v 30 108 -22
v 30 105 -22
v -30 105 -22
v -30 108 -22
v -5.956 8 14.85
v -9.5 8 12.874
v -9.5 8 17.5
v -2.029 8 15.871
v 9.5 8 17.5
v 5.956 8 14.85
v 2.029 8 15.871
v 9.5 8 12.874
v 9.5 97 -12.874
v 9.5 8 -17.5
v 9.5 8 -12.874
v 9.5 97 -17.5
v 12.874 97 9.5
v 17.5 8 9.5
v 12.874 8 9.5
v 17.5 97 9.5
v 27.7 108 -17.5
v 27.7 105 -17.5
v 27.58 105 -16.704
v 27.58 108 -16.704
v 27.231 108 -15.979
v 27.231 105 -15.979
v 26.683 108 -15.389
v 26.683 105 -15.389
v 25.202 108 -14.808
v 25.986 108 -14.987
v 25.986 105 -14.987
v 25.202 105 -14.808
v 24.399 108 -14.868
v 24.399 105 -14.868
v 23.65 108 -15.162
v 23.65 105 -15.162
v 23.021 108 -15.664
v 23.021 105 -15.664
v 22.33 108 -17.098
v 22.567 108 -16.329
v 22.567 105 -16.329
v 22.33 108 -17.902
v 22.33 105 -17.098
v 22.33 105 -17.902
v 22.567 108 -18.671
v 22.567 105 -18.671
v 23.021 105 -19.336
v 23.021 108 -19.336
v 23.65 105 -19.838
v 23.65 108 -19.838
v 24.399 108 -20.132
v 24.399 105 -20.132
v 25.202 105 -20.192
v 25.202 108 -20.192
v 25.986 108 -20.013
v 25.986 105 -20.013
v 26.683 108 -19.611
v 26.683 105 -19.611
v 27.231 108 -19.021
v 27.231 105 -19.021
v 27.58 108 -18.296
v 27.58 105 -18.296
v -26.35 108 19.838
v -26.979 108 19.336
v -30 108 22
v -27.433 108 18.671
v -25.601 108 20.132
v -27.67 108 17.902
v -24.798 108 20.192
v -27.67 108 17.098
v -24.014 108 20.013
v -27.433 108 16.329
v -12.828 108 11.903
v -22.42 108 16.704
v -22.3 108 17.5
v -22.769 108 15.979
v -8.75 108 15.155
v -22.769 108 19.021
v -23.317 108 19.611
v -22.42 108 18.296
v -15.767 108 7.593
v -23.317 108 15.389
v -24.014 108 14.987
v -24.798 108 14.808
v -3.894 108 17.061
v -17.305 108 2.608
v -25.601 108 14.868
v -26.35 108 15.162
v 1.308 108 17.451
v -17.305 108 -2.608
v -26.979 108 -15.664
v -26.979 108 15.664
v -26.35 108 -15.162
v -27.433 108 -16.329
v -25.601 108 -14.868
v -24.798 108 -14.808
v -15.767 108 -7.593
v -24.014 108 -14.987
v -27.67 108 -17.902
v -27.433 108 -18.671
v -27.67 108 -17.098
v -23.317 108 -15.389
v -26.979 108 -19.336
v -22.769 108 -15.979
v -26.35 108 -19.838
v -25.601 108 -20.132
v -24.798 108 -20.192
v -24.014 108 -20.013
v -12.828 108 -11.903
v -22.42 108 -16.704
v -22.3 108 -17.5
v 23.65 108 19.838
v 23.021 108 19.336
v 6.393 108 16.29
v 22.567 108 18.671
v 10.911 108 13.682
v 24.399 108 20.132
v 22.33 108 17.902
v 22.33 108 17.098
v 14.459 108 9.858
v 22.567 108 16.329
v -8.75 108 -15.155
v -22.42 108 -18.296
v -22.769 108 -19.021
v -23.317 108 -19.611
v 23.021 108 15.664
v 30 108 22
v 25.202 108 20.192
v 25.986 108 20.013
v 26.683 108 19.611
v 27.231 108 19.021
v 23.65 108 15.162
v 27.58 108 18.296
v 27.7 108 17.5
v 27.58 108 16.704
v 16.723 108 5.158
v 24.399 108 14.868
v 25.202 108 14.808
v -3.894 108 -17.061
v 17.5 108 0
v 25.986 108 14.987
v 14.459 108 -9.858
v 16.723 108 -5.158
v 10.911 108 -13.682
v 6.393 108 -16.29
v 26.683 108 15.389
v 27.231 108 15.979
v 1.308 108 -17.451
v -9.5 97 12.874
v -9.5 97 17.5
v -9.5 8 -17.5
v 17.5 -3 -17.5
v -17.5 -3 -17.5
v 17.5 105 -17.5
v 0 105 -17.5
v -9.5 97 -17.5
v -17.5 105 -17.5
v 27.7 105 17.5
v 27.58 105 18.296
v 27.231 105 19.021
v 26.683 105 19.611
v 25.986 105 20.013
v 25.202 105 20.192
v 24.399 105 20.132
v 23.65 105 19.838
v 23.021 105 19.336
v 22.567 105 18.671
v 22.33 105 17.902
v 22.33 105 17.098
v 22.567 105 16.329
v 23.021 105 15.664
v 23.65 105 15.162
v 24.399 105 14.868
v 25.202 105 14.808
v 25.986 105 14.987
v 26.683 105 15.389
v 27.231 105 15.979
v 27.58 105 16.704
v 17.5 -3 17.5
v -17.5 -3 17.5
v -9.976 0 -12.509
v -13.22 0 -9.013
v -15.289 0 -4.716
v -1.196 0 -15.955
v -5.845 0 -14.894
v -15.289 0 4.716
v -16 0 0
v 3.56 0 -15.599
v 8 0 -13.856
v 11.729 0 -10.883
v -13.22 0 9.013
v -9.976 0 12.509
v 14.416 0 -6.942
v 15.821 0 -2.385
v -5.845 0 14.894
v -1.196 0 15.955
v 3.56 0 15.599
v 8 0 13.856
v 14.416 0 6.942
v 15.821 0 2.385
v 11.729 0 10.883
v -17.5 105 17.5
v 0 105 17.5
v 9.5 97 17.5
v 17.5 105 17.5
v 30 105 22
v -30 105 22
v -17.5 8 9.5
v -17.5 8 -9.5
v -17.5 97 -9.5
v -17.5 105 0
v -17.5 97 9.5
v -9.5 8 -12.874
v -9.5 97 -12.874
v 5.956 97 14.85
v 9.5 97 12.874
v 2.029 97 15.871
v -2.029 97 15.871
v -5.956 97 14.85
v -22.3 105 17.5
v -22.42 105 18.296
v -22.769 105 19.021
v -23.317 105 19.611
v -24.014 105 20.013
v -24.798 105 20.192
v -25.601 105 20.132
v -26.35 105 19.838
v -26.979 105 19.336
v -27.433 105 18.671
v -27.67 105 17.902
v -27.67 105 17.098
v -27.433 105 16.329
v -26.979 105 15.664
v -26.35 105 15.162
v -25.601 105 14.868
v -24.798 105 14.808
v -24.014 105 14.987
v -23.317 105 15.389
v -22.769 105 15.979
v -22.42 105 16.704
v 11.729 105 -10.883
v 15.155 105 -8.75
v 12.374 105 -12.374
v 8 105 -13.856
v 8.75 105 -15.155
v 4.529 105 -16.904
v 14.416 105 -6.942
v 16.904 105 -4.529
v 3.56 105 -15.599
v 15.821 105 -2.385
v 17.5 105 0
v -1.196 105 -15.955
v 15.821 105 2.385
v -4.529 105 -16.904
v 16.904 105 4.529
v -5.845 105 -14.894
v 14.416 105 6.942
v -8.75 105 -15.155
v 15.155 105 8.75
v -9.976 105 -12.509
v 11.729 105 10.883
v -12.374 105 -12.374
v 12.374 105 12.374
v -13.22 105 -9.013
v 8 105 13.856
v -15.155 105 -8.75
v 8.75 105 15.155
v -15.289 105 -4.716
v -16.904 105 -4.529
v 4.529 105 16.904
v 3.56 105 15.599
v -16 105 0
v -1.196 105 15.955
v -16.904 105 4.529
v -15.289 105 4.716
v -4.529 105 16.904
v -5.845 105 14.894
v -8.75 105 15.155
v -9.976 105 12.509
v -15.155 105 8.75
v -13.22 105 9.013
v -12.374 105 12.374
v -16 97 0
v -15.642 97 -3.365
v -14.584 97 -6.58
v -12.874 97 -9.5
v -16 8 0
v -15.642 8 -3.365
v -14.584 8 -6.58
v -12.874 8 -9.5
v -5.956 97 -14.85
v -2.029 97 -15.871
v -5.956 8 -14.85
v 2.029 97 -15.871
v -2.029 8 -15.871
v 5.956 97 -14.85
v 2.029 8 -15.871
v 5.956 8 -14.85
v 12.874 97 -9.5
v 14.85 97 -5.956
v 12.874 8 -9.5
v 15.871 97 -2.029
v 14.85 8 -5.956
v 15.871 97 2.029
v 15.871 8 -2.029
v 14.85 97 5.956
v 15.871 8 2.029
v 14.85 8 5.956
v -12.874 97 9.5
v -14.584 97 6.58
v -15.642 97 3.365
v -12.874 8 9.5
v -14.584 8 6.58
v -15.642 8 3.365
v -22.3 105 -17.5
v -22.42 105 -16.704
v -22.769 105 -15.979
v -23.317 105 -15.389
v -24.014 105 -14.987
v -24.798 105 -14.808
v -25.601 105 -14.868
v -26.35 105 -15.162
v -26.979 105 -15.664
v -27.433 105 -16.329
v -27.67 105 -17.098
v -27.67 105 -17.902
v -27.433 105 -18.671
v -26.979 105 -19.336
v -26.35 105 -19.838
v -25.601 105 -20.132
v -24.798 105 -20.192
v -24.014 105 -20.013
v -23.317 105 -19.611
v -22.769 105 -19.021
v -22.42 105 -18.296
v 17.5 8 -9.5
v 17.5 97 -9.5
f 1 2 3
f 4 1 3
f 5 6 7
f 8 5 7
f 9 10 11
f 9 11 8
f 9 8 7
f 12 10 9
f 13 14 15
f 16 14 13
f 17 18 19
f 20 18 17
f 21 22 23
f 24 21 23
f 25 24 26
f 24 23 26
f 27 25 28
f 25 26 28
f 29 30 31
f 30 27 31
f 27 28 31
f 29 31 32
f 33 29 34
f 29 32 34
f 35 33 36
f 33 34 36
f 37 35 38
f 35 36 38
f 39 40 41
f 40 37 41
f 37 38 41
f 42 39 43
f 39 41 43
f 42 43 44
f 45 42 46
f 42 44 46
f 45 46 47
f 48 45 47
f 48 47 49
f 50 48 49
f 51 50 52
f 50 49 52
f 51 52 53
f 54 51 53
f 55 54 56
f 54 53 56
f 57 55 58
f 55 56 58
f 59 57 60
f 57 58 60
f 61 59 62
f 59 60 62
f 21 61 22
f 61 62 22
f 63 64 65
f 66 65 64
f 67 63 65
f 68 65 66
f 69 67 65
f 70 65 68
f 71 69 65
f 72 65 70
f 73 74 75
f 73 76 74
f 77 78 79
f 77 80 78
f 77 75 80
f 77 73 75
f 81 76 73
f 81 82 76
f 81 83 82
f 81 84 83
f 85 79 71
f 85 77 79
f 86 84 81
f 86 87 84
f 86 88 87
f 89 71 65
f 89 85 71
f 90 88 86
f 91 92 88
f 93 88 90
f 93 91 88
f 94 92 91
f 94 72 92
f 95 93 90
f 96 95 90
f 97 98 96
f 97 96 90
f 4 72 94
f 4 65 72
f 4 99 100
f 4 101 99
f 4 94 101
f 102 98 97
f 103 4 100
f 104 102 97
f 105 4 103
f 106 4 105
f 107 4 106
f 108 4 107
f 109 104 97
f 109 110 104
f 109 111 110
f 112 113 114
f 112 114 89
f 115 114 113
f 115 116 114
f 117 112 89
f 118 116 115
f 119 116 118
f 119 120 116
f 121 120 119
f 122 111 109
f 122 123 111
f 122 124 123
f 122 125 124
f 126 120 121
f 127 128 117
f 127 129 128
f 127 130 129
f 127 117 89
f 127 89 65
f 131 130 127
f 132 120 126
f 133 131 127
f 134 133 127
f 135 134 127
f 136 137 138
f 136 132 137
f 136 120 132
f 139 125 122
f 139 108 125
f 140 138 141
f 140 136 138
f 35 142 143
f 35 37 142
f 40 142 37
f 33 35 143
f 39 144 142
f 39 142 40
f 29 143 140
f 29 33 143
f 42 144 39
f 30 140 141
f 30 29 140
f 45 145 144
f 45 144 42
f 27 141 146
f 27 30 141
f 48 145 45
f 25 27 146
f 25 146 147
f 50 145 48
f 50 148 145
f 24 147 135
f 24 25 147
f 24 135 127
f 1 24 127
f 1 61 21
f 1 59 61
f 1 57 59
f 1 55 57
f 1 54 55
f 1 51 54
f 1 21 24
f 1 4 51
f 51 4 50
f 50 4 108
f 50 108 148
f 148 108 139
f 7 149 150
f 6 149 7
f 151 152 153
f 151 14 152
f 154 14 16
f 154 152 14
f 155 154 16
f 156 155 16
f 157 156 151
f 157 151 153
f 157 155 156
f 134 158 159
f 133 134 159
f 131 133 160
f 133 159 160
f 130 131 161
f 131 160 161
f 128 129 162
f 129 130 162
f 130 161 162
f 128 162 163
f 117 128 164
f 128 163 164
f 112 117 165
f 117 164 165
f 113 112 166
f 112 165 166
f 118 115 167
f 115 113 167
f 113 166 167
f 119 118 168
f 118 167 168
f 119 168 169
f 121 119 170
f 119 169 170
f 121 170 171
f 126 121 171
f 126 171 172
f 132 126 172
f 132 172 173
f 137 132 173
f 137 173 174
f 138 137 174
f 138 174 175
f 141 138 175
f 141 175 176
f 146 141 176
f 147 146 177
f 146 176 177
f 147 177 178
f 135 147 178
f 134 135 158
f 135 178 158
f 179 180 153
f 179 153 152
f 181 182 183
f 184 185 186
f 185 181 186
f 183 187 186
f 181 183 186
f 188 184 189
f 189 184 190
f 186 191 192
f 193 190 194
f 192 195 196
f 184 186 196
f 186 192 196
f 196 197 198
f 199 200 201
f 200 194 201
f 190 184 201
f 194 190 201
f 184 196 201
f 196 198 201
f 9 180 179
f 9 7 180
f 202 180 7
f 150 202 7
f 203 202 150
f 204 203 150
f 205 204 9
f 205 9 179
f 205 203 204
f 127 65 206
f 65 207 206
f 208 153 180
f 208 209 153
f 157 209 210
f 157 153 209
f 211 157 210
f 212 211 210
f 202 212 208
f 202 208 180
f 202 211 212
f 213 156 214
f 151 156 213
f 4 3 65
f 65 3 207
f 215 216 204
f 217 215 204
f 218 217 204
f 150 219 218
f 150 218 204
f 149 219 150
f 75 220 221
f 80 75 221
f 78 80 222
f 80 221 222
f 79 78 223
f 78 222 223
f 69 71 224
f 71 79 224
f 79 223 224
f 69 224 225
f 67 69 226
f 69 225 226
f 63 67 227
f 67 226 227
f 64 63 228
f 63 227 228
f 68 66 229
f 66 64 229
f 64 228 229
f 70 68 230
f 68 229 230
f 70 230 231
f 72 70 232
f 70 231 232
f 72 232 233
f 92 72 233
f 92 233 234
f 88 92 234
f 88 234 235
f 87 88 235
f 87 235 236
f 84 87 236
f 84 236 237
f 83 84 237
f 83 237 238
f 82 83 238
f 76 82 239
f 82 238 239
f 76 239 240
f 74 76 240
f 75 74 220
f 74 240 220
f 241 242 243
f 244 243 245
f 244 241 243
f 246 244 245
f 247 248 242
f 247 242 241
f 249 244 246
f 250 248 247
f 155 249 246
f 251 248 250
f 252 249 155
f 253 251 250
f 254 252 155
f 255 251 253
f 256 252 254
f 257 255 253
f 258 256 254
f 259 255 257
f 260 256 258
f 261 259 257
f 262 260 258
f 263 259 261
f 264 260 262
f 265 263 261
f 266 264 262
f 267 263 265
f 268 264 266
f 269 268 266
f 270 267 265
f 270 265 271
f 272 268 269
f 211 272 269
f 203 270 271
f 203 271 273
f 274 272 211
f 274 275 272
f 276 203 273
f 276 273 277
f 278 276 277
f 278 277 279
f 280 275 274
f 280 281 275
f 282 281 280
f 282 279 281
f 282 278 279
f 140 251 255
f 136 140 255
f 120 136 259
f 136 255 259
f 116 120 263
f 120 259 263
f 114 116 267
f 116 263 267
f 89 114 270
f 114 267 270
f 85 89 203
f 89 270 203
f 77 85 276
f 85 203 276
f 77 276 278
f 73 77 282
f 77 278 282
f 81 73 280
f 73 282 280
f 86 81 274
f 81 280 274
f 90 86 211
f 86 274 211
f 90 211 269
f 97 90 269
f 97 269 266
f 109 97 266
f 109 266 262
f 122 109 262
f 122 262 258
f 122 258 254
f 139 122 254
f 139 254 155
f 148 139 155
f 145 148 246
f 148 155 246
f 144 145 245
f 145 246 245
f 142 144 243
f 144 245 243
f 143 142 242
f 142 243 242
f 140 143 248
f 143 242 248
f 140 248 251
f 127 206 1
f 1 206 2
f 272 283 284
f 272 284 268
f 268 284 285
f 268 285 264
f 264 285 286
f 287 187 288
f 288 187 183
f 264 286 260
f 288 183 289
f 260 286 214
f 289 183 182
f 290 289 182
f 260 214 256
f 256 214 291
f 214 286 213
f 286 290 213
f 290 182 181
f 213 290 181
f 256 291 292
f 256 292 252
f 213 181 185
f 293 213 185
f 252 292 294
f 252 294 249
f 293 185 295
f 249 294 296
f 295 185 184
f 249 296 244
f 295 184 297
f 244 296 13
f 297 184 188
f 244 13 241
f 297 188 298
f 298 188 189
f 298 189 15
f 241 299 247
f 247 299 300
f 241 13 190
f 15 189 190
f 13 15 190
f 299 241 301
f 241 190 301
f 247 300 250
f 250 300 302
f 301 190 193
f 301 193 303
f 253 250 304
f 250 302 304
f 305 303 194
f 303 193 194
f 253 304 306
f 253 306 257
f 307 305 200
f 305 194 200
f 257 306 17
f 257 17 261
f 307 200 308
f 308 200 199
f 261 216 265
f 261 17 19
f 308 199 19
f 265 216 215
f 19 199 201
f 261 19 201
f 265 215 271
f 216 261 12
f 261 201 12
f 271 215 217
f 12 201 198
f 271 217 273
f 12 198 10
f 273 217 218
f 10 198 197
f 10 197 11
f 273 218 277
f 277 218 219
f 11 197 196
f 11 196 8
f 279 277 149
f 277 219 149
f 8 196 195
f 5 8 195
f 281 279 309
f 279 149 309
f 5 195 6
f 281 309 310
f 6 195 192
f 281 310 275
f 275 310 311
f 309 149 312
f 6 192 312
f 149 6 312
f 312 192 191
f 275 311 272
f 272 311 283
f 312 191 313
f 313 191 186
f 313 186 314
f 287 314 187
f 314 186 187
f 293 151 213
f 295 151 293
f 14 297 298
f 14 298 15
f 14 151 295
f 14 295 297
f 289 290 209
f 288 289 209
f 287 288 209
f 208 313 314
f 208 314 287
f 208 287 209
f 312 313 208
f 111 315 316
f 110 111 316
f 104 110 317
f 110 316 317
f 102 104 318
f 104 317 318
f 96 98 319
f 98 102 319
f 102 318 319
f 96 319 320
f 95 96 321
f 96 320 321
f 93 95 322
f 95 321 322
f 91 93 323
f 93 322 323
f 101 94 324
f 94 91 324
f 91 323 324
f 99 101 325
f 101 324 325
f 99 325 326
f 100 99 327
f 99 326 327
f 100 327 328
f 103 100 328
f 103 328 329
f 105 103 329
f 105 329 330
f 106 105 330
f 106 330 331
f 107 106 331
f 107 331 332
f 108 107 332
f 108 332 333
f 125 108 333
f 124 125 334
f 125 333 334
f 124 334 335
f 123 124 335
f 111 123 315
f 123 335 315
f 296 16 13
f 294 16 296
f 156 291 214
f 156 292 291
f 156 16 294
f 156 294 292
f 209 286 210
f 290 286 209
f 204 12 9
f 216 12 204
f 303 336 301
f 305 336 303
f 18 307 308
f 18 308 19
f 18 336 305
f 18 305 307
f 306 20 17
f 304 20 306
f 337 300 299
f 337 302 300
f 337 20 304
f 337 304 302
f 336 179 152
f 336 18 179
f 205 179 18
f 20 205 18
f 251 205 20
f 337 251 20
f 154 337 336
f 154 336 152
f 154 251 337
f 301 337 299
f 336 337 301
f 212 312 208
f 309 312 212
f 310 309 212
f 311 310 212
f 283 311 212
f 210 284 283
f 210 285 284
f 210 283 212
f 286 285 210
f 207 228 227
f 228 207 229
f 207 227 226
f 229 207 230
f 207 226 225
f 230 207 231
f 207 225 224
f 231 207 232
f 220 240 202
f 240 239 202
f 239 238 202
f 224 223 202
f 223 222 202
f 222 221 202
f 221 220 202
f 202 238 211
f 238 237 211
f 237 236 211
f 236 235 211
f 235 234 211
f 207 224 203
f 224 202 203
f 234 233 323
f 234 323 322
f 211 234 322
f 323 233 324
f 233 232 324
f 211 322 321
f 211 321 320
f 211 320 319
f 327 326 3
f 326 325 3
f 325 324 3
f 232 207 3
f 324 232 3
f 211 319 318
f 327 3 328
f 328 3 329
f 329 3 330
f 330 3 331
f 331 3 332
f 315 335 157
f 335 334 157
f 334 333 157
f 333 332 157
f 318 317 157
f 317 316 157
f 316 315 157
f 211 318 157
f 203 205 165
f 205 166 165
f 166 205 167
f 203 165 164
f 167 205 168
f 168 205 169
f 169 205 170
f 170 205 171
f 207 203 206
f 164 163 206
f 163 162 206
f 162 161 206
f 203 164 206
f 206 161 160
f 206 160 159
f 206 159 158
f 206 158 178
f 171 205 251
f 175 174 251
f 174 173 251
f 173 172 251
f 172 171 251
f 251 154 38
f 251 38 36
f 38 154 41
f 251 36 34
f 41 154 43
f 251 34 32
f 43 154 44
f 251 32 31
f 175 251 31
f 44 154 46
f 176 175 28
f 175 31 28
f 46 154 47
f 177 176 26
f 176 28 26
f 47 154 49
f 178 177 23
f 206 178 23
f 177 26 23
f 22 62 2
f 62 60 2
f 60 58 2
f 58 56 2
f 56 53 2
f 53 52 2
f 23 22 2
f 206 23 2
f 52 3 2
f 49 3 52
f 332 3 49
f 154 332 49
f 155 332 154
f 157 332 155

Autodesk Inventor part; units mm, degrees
ref_plane "YZ Plane" through (0, 0, 0) normal (1, 0, 0) x (0, 1, 0)
ref_plane "XZ Plane" through (0, 0, 0) normal (0, 1, 0) x (-1, 0, 0)
ref_plane "XY Plane" through (0, 0, 0) normal (0, 0, 1) x (1, 0, 0)
sketch "Sketch1" plane through (0, 0, 0) normal (0, 1, 0) x (-1, 0, 0)
  line L0 (17.5, 17.5) -> (-17.5, 17.5)
  line L1 (-17.5, 17.5) -> (-17.5, -17.5)
  line L2 (-17.5, -17.5) -> (17.5, -17.5)
  line L3 (17.5, -17.5) -> (17.5, 17.5)
  line L4 (17.5, 17.5) -> (-17.5, -17.5) construction
  line L5 (-17.5, 17.5) -> (17.5, -17.5) construction
  circle A0 centre (0, 0) radius 16
  dimension "d0" = 35
  dimension "d1" = 35
  dimension "d2" = 32
extrude "Extrusion1" add sketch "Sketch1" along normal blind 105
sketch "Sketch2" plane through (17.5, 0, 17.5) normal (1, 0, 0) x (0, 0, -1)
  line L0 (27, 8) -> (8, 8)
  line L1 (8, 8) -> (8, 97)
  line L2 (8, 97) -> (27, 97)
  line L3 (27, 97) -> (27, 8)
  line L4 (0, 0) -> (35, 0) projected
  line L5 (0, 0) -> (0, 105) projected
  line L6 (35, 0) -> (35, 105) projected
  line L7 (0, 105) -> (35, 105) projected
  point P0 (17.5, 0)
  dimension "d5" = 8
  dimension "d6" = 8
  dimension "d7" = 8
  dimension "d8" = 8
extrude "Extrusion2" cut sketch "Sketch2" against normal through all contours L0 L1 L2 L3
sketch "Sketch3" plane through (17.5, 0, -17.5) normal (0, 0, -1) x (-1, 0, 0)
  line L0 (8, 97) -> (27, 97)
  line L1 (27, 97) -> (27, 8)
  line L2 (27, 8) -> (8, 8)
  line L3 (8, 8) -> (8, 97)
  line L4 (0, 0) -> (0, 105) projected
  line L5 (35, 0) -> (35, 105) projected
  line L6 (0, 105) -> (35, 105) projected
  line L7 (0, 0) -> (35, 0) projected
  point P0 (17.5, 0)
  dimension "d11" = 8
  dimension "d12" = 8
  dimension "d13" = 8
  dimension "d14" = 8
extrude "Extrusion3" cut sketch "Sketch3" against normal through all contours L0 L1 L2 L3
sketch "Sketch4" plane through (0, 0, 0) normal (0, -1, 0) x (1, 0, 0)
  line L0 (17.5, 17.5) -> (17.5, -17.5) projected
  line L1 (-17.5, 17.5) -> (17.5, 17.5)
  line L2 (17.5, 17.5) -> (17.5, -17.5)
  line L3 (17.5, -17.5) -> (-17.5, -17.5)
  line L4 (-17.5, -17.5) -> (-17.5, 17.5)
  line L5 (-17.5, 17.5) -> (17.5, -17.5) construction
  line L6 (17.5, 17.5) -> (-17.5, -17.5) construction
  point P0 (0, 0)
extrude "Extrusion4" add sketch "Sketch4" along normal blind 3
sketch "Sketch5" plane through (0, 105, 0) normal (0, 1, 0) x (1, 0, 0)
  line L0 (30, 22) -> (-30, 22)
  line L1 (-30, 22) -> (-30, -22)
  line L2 (-30, -22) -> (30, -22)
  line L3 (30, -22) -> (30, 22)
  line L4 (30, 22) -> (-30, -22) construction
  line L5 (-30, 22) -> (30, -22) construction
  circle A0 centre (0, 0) radius 17.5
  circle A1 centre (25, -17.5) radius 2.7
  circle A2 centre (25, 17.5) radius 2.7
  circle A3 centre (-25, 17.5) radius 2.7
  circle A4 centre (-25, -17.5) radius 2.7
  dimension "d19" = 60
  dimension "d20" = 44
  dimension "d21" = 35
  dimension "d22" = 5.4
  dimension "d23" = 4.5
  dimension "d24" = 5
  dimension "d25" = 5.4
  dimension "d26" = 4.5
  dimension "d27" = 5
  dimension "d28" = 4.5
  dimension "d29" = 5
  dimension "d30" = 5.4
  dimension "d31" = 5.4
  dimension "d32" = 4.5
  dimension "d33" = 5
extrude "Extrusion5" add sketch "Sketch5" along normal blind 3
equation "\"d0\" = d1"
equation "\"d6\" = d5"
equation "\"d7\" = d6"
equation "\"d8\" = d5"
equation "\"d12\" = d11"
equation "\"d13\" = d11"
equation "\"d14\" = d11"
equation "\"d25\" = d22"
equation "\"d26\" = d23"
equation "\"d27\" = d24"
equation "\"d28\" = d32"
equation "\"d29\" = d24"
equation "\"d30\" = d22"
equation "\"d31\" = d22"
equation "\"d32\" = d23"
equation "\"d33\" = d24"
properties part number "port tube v01"
